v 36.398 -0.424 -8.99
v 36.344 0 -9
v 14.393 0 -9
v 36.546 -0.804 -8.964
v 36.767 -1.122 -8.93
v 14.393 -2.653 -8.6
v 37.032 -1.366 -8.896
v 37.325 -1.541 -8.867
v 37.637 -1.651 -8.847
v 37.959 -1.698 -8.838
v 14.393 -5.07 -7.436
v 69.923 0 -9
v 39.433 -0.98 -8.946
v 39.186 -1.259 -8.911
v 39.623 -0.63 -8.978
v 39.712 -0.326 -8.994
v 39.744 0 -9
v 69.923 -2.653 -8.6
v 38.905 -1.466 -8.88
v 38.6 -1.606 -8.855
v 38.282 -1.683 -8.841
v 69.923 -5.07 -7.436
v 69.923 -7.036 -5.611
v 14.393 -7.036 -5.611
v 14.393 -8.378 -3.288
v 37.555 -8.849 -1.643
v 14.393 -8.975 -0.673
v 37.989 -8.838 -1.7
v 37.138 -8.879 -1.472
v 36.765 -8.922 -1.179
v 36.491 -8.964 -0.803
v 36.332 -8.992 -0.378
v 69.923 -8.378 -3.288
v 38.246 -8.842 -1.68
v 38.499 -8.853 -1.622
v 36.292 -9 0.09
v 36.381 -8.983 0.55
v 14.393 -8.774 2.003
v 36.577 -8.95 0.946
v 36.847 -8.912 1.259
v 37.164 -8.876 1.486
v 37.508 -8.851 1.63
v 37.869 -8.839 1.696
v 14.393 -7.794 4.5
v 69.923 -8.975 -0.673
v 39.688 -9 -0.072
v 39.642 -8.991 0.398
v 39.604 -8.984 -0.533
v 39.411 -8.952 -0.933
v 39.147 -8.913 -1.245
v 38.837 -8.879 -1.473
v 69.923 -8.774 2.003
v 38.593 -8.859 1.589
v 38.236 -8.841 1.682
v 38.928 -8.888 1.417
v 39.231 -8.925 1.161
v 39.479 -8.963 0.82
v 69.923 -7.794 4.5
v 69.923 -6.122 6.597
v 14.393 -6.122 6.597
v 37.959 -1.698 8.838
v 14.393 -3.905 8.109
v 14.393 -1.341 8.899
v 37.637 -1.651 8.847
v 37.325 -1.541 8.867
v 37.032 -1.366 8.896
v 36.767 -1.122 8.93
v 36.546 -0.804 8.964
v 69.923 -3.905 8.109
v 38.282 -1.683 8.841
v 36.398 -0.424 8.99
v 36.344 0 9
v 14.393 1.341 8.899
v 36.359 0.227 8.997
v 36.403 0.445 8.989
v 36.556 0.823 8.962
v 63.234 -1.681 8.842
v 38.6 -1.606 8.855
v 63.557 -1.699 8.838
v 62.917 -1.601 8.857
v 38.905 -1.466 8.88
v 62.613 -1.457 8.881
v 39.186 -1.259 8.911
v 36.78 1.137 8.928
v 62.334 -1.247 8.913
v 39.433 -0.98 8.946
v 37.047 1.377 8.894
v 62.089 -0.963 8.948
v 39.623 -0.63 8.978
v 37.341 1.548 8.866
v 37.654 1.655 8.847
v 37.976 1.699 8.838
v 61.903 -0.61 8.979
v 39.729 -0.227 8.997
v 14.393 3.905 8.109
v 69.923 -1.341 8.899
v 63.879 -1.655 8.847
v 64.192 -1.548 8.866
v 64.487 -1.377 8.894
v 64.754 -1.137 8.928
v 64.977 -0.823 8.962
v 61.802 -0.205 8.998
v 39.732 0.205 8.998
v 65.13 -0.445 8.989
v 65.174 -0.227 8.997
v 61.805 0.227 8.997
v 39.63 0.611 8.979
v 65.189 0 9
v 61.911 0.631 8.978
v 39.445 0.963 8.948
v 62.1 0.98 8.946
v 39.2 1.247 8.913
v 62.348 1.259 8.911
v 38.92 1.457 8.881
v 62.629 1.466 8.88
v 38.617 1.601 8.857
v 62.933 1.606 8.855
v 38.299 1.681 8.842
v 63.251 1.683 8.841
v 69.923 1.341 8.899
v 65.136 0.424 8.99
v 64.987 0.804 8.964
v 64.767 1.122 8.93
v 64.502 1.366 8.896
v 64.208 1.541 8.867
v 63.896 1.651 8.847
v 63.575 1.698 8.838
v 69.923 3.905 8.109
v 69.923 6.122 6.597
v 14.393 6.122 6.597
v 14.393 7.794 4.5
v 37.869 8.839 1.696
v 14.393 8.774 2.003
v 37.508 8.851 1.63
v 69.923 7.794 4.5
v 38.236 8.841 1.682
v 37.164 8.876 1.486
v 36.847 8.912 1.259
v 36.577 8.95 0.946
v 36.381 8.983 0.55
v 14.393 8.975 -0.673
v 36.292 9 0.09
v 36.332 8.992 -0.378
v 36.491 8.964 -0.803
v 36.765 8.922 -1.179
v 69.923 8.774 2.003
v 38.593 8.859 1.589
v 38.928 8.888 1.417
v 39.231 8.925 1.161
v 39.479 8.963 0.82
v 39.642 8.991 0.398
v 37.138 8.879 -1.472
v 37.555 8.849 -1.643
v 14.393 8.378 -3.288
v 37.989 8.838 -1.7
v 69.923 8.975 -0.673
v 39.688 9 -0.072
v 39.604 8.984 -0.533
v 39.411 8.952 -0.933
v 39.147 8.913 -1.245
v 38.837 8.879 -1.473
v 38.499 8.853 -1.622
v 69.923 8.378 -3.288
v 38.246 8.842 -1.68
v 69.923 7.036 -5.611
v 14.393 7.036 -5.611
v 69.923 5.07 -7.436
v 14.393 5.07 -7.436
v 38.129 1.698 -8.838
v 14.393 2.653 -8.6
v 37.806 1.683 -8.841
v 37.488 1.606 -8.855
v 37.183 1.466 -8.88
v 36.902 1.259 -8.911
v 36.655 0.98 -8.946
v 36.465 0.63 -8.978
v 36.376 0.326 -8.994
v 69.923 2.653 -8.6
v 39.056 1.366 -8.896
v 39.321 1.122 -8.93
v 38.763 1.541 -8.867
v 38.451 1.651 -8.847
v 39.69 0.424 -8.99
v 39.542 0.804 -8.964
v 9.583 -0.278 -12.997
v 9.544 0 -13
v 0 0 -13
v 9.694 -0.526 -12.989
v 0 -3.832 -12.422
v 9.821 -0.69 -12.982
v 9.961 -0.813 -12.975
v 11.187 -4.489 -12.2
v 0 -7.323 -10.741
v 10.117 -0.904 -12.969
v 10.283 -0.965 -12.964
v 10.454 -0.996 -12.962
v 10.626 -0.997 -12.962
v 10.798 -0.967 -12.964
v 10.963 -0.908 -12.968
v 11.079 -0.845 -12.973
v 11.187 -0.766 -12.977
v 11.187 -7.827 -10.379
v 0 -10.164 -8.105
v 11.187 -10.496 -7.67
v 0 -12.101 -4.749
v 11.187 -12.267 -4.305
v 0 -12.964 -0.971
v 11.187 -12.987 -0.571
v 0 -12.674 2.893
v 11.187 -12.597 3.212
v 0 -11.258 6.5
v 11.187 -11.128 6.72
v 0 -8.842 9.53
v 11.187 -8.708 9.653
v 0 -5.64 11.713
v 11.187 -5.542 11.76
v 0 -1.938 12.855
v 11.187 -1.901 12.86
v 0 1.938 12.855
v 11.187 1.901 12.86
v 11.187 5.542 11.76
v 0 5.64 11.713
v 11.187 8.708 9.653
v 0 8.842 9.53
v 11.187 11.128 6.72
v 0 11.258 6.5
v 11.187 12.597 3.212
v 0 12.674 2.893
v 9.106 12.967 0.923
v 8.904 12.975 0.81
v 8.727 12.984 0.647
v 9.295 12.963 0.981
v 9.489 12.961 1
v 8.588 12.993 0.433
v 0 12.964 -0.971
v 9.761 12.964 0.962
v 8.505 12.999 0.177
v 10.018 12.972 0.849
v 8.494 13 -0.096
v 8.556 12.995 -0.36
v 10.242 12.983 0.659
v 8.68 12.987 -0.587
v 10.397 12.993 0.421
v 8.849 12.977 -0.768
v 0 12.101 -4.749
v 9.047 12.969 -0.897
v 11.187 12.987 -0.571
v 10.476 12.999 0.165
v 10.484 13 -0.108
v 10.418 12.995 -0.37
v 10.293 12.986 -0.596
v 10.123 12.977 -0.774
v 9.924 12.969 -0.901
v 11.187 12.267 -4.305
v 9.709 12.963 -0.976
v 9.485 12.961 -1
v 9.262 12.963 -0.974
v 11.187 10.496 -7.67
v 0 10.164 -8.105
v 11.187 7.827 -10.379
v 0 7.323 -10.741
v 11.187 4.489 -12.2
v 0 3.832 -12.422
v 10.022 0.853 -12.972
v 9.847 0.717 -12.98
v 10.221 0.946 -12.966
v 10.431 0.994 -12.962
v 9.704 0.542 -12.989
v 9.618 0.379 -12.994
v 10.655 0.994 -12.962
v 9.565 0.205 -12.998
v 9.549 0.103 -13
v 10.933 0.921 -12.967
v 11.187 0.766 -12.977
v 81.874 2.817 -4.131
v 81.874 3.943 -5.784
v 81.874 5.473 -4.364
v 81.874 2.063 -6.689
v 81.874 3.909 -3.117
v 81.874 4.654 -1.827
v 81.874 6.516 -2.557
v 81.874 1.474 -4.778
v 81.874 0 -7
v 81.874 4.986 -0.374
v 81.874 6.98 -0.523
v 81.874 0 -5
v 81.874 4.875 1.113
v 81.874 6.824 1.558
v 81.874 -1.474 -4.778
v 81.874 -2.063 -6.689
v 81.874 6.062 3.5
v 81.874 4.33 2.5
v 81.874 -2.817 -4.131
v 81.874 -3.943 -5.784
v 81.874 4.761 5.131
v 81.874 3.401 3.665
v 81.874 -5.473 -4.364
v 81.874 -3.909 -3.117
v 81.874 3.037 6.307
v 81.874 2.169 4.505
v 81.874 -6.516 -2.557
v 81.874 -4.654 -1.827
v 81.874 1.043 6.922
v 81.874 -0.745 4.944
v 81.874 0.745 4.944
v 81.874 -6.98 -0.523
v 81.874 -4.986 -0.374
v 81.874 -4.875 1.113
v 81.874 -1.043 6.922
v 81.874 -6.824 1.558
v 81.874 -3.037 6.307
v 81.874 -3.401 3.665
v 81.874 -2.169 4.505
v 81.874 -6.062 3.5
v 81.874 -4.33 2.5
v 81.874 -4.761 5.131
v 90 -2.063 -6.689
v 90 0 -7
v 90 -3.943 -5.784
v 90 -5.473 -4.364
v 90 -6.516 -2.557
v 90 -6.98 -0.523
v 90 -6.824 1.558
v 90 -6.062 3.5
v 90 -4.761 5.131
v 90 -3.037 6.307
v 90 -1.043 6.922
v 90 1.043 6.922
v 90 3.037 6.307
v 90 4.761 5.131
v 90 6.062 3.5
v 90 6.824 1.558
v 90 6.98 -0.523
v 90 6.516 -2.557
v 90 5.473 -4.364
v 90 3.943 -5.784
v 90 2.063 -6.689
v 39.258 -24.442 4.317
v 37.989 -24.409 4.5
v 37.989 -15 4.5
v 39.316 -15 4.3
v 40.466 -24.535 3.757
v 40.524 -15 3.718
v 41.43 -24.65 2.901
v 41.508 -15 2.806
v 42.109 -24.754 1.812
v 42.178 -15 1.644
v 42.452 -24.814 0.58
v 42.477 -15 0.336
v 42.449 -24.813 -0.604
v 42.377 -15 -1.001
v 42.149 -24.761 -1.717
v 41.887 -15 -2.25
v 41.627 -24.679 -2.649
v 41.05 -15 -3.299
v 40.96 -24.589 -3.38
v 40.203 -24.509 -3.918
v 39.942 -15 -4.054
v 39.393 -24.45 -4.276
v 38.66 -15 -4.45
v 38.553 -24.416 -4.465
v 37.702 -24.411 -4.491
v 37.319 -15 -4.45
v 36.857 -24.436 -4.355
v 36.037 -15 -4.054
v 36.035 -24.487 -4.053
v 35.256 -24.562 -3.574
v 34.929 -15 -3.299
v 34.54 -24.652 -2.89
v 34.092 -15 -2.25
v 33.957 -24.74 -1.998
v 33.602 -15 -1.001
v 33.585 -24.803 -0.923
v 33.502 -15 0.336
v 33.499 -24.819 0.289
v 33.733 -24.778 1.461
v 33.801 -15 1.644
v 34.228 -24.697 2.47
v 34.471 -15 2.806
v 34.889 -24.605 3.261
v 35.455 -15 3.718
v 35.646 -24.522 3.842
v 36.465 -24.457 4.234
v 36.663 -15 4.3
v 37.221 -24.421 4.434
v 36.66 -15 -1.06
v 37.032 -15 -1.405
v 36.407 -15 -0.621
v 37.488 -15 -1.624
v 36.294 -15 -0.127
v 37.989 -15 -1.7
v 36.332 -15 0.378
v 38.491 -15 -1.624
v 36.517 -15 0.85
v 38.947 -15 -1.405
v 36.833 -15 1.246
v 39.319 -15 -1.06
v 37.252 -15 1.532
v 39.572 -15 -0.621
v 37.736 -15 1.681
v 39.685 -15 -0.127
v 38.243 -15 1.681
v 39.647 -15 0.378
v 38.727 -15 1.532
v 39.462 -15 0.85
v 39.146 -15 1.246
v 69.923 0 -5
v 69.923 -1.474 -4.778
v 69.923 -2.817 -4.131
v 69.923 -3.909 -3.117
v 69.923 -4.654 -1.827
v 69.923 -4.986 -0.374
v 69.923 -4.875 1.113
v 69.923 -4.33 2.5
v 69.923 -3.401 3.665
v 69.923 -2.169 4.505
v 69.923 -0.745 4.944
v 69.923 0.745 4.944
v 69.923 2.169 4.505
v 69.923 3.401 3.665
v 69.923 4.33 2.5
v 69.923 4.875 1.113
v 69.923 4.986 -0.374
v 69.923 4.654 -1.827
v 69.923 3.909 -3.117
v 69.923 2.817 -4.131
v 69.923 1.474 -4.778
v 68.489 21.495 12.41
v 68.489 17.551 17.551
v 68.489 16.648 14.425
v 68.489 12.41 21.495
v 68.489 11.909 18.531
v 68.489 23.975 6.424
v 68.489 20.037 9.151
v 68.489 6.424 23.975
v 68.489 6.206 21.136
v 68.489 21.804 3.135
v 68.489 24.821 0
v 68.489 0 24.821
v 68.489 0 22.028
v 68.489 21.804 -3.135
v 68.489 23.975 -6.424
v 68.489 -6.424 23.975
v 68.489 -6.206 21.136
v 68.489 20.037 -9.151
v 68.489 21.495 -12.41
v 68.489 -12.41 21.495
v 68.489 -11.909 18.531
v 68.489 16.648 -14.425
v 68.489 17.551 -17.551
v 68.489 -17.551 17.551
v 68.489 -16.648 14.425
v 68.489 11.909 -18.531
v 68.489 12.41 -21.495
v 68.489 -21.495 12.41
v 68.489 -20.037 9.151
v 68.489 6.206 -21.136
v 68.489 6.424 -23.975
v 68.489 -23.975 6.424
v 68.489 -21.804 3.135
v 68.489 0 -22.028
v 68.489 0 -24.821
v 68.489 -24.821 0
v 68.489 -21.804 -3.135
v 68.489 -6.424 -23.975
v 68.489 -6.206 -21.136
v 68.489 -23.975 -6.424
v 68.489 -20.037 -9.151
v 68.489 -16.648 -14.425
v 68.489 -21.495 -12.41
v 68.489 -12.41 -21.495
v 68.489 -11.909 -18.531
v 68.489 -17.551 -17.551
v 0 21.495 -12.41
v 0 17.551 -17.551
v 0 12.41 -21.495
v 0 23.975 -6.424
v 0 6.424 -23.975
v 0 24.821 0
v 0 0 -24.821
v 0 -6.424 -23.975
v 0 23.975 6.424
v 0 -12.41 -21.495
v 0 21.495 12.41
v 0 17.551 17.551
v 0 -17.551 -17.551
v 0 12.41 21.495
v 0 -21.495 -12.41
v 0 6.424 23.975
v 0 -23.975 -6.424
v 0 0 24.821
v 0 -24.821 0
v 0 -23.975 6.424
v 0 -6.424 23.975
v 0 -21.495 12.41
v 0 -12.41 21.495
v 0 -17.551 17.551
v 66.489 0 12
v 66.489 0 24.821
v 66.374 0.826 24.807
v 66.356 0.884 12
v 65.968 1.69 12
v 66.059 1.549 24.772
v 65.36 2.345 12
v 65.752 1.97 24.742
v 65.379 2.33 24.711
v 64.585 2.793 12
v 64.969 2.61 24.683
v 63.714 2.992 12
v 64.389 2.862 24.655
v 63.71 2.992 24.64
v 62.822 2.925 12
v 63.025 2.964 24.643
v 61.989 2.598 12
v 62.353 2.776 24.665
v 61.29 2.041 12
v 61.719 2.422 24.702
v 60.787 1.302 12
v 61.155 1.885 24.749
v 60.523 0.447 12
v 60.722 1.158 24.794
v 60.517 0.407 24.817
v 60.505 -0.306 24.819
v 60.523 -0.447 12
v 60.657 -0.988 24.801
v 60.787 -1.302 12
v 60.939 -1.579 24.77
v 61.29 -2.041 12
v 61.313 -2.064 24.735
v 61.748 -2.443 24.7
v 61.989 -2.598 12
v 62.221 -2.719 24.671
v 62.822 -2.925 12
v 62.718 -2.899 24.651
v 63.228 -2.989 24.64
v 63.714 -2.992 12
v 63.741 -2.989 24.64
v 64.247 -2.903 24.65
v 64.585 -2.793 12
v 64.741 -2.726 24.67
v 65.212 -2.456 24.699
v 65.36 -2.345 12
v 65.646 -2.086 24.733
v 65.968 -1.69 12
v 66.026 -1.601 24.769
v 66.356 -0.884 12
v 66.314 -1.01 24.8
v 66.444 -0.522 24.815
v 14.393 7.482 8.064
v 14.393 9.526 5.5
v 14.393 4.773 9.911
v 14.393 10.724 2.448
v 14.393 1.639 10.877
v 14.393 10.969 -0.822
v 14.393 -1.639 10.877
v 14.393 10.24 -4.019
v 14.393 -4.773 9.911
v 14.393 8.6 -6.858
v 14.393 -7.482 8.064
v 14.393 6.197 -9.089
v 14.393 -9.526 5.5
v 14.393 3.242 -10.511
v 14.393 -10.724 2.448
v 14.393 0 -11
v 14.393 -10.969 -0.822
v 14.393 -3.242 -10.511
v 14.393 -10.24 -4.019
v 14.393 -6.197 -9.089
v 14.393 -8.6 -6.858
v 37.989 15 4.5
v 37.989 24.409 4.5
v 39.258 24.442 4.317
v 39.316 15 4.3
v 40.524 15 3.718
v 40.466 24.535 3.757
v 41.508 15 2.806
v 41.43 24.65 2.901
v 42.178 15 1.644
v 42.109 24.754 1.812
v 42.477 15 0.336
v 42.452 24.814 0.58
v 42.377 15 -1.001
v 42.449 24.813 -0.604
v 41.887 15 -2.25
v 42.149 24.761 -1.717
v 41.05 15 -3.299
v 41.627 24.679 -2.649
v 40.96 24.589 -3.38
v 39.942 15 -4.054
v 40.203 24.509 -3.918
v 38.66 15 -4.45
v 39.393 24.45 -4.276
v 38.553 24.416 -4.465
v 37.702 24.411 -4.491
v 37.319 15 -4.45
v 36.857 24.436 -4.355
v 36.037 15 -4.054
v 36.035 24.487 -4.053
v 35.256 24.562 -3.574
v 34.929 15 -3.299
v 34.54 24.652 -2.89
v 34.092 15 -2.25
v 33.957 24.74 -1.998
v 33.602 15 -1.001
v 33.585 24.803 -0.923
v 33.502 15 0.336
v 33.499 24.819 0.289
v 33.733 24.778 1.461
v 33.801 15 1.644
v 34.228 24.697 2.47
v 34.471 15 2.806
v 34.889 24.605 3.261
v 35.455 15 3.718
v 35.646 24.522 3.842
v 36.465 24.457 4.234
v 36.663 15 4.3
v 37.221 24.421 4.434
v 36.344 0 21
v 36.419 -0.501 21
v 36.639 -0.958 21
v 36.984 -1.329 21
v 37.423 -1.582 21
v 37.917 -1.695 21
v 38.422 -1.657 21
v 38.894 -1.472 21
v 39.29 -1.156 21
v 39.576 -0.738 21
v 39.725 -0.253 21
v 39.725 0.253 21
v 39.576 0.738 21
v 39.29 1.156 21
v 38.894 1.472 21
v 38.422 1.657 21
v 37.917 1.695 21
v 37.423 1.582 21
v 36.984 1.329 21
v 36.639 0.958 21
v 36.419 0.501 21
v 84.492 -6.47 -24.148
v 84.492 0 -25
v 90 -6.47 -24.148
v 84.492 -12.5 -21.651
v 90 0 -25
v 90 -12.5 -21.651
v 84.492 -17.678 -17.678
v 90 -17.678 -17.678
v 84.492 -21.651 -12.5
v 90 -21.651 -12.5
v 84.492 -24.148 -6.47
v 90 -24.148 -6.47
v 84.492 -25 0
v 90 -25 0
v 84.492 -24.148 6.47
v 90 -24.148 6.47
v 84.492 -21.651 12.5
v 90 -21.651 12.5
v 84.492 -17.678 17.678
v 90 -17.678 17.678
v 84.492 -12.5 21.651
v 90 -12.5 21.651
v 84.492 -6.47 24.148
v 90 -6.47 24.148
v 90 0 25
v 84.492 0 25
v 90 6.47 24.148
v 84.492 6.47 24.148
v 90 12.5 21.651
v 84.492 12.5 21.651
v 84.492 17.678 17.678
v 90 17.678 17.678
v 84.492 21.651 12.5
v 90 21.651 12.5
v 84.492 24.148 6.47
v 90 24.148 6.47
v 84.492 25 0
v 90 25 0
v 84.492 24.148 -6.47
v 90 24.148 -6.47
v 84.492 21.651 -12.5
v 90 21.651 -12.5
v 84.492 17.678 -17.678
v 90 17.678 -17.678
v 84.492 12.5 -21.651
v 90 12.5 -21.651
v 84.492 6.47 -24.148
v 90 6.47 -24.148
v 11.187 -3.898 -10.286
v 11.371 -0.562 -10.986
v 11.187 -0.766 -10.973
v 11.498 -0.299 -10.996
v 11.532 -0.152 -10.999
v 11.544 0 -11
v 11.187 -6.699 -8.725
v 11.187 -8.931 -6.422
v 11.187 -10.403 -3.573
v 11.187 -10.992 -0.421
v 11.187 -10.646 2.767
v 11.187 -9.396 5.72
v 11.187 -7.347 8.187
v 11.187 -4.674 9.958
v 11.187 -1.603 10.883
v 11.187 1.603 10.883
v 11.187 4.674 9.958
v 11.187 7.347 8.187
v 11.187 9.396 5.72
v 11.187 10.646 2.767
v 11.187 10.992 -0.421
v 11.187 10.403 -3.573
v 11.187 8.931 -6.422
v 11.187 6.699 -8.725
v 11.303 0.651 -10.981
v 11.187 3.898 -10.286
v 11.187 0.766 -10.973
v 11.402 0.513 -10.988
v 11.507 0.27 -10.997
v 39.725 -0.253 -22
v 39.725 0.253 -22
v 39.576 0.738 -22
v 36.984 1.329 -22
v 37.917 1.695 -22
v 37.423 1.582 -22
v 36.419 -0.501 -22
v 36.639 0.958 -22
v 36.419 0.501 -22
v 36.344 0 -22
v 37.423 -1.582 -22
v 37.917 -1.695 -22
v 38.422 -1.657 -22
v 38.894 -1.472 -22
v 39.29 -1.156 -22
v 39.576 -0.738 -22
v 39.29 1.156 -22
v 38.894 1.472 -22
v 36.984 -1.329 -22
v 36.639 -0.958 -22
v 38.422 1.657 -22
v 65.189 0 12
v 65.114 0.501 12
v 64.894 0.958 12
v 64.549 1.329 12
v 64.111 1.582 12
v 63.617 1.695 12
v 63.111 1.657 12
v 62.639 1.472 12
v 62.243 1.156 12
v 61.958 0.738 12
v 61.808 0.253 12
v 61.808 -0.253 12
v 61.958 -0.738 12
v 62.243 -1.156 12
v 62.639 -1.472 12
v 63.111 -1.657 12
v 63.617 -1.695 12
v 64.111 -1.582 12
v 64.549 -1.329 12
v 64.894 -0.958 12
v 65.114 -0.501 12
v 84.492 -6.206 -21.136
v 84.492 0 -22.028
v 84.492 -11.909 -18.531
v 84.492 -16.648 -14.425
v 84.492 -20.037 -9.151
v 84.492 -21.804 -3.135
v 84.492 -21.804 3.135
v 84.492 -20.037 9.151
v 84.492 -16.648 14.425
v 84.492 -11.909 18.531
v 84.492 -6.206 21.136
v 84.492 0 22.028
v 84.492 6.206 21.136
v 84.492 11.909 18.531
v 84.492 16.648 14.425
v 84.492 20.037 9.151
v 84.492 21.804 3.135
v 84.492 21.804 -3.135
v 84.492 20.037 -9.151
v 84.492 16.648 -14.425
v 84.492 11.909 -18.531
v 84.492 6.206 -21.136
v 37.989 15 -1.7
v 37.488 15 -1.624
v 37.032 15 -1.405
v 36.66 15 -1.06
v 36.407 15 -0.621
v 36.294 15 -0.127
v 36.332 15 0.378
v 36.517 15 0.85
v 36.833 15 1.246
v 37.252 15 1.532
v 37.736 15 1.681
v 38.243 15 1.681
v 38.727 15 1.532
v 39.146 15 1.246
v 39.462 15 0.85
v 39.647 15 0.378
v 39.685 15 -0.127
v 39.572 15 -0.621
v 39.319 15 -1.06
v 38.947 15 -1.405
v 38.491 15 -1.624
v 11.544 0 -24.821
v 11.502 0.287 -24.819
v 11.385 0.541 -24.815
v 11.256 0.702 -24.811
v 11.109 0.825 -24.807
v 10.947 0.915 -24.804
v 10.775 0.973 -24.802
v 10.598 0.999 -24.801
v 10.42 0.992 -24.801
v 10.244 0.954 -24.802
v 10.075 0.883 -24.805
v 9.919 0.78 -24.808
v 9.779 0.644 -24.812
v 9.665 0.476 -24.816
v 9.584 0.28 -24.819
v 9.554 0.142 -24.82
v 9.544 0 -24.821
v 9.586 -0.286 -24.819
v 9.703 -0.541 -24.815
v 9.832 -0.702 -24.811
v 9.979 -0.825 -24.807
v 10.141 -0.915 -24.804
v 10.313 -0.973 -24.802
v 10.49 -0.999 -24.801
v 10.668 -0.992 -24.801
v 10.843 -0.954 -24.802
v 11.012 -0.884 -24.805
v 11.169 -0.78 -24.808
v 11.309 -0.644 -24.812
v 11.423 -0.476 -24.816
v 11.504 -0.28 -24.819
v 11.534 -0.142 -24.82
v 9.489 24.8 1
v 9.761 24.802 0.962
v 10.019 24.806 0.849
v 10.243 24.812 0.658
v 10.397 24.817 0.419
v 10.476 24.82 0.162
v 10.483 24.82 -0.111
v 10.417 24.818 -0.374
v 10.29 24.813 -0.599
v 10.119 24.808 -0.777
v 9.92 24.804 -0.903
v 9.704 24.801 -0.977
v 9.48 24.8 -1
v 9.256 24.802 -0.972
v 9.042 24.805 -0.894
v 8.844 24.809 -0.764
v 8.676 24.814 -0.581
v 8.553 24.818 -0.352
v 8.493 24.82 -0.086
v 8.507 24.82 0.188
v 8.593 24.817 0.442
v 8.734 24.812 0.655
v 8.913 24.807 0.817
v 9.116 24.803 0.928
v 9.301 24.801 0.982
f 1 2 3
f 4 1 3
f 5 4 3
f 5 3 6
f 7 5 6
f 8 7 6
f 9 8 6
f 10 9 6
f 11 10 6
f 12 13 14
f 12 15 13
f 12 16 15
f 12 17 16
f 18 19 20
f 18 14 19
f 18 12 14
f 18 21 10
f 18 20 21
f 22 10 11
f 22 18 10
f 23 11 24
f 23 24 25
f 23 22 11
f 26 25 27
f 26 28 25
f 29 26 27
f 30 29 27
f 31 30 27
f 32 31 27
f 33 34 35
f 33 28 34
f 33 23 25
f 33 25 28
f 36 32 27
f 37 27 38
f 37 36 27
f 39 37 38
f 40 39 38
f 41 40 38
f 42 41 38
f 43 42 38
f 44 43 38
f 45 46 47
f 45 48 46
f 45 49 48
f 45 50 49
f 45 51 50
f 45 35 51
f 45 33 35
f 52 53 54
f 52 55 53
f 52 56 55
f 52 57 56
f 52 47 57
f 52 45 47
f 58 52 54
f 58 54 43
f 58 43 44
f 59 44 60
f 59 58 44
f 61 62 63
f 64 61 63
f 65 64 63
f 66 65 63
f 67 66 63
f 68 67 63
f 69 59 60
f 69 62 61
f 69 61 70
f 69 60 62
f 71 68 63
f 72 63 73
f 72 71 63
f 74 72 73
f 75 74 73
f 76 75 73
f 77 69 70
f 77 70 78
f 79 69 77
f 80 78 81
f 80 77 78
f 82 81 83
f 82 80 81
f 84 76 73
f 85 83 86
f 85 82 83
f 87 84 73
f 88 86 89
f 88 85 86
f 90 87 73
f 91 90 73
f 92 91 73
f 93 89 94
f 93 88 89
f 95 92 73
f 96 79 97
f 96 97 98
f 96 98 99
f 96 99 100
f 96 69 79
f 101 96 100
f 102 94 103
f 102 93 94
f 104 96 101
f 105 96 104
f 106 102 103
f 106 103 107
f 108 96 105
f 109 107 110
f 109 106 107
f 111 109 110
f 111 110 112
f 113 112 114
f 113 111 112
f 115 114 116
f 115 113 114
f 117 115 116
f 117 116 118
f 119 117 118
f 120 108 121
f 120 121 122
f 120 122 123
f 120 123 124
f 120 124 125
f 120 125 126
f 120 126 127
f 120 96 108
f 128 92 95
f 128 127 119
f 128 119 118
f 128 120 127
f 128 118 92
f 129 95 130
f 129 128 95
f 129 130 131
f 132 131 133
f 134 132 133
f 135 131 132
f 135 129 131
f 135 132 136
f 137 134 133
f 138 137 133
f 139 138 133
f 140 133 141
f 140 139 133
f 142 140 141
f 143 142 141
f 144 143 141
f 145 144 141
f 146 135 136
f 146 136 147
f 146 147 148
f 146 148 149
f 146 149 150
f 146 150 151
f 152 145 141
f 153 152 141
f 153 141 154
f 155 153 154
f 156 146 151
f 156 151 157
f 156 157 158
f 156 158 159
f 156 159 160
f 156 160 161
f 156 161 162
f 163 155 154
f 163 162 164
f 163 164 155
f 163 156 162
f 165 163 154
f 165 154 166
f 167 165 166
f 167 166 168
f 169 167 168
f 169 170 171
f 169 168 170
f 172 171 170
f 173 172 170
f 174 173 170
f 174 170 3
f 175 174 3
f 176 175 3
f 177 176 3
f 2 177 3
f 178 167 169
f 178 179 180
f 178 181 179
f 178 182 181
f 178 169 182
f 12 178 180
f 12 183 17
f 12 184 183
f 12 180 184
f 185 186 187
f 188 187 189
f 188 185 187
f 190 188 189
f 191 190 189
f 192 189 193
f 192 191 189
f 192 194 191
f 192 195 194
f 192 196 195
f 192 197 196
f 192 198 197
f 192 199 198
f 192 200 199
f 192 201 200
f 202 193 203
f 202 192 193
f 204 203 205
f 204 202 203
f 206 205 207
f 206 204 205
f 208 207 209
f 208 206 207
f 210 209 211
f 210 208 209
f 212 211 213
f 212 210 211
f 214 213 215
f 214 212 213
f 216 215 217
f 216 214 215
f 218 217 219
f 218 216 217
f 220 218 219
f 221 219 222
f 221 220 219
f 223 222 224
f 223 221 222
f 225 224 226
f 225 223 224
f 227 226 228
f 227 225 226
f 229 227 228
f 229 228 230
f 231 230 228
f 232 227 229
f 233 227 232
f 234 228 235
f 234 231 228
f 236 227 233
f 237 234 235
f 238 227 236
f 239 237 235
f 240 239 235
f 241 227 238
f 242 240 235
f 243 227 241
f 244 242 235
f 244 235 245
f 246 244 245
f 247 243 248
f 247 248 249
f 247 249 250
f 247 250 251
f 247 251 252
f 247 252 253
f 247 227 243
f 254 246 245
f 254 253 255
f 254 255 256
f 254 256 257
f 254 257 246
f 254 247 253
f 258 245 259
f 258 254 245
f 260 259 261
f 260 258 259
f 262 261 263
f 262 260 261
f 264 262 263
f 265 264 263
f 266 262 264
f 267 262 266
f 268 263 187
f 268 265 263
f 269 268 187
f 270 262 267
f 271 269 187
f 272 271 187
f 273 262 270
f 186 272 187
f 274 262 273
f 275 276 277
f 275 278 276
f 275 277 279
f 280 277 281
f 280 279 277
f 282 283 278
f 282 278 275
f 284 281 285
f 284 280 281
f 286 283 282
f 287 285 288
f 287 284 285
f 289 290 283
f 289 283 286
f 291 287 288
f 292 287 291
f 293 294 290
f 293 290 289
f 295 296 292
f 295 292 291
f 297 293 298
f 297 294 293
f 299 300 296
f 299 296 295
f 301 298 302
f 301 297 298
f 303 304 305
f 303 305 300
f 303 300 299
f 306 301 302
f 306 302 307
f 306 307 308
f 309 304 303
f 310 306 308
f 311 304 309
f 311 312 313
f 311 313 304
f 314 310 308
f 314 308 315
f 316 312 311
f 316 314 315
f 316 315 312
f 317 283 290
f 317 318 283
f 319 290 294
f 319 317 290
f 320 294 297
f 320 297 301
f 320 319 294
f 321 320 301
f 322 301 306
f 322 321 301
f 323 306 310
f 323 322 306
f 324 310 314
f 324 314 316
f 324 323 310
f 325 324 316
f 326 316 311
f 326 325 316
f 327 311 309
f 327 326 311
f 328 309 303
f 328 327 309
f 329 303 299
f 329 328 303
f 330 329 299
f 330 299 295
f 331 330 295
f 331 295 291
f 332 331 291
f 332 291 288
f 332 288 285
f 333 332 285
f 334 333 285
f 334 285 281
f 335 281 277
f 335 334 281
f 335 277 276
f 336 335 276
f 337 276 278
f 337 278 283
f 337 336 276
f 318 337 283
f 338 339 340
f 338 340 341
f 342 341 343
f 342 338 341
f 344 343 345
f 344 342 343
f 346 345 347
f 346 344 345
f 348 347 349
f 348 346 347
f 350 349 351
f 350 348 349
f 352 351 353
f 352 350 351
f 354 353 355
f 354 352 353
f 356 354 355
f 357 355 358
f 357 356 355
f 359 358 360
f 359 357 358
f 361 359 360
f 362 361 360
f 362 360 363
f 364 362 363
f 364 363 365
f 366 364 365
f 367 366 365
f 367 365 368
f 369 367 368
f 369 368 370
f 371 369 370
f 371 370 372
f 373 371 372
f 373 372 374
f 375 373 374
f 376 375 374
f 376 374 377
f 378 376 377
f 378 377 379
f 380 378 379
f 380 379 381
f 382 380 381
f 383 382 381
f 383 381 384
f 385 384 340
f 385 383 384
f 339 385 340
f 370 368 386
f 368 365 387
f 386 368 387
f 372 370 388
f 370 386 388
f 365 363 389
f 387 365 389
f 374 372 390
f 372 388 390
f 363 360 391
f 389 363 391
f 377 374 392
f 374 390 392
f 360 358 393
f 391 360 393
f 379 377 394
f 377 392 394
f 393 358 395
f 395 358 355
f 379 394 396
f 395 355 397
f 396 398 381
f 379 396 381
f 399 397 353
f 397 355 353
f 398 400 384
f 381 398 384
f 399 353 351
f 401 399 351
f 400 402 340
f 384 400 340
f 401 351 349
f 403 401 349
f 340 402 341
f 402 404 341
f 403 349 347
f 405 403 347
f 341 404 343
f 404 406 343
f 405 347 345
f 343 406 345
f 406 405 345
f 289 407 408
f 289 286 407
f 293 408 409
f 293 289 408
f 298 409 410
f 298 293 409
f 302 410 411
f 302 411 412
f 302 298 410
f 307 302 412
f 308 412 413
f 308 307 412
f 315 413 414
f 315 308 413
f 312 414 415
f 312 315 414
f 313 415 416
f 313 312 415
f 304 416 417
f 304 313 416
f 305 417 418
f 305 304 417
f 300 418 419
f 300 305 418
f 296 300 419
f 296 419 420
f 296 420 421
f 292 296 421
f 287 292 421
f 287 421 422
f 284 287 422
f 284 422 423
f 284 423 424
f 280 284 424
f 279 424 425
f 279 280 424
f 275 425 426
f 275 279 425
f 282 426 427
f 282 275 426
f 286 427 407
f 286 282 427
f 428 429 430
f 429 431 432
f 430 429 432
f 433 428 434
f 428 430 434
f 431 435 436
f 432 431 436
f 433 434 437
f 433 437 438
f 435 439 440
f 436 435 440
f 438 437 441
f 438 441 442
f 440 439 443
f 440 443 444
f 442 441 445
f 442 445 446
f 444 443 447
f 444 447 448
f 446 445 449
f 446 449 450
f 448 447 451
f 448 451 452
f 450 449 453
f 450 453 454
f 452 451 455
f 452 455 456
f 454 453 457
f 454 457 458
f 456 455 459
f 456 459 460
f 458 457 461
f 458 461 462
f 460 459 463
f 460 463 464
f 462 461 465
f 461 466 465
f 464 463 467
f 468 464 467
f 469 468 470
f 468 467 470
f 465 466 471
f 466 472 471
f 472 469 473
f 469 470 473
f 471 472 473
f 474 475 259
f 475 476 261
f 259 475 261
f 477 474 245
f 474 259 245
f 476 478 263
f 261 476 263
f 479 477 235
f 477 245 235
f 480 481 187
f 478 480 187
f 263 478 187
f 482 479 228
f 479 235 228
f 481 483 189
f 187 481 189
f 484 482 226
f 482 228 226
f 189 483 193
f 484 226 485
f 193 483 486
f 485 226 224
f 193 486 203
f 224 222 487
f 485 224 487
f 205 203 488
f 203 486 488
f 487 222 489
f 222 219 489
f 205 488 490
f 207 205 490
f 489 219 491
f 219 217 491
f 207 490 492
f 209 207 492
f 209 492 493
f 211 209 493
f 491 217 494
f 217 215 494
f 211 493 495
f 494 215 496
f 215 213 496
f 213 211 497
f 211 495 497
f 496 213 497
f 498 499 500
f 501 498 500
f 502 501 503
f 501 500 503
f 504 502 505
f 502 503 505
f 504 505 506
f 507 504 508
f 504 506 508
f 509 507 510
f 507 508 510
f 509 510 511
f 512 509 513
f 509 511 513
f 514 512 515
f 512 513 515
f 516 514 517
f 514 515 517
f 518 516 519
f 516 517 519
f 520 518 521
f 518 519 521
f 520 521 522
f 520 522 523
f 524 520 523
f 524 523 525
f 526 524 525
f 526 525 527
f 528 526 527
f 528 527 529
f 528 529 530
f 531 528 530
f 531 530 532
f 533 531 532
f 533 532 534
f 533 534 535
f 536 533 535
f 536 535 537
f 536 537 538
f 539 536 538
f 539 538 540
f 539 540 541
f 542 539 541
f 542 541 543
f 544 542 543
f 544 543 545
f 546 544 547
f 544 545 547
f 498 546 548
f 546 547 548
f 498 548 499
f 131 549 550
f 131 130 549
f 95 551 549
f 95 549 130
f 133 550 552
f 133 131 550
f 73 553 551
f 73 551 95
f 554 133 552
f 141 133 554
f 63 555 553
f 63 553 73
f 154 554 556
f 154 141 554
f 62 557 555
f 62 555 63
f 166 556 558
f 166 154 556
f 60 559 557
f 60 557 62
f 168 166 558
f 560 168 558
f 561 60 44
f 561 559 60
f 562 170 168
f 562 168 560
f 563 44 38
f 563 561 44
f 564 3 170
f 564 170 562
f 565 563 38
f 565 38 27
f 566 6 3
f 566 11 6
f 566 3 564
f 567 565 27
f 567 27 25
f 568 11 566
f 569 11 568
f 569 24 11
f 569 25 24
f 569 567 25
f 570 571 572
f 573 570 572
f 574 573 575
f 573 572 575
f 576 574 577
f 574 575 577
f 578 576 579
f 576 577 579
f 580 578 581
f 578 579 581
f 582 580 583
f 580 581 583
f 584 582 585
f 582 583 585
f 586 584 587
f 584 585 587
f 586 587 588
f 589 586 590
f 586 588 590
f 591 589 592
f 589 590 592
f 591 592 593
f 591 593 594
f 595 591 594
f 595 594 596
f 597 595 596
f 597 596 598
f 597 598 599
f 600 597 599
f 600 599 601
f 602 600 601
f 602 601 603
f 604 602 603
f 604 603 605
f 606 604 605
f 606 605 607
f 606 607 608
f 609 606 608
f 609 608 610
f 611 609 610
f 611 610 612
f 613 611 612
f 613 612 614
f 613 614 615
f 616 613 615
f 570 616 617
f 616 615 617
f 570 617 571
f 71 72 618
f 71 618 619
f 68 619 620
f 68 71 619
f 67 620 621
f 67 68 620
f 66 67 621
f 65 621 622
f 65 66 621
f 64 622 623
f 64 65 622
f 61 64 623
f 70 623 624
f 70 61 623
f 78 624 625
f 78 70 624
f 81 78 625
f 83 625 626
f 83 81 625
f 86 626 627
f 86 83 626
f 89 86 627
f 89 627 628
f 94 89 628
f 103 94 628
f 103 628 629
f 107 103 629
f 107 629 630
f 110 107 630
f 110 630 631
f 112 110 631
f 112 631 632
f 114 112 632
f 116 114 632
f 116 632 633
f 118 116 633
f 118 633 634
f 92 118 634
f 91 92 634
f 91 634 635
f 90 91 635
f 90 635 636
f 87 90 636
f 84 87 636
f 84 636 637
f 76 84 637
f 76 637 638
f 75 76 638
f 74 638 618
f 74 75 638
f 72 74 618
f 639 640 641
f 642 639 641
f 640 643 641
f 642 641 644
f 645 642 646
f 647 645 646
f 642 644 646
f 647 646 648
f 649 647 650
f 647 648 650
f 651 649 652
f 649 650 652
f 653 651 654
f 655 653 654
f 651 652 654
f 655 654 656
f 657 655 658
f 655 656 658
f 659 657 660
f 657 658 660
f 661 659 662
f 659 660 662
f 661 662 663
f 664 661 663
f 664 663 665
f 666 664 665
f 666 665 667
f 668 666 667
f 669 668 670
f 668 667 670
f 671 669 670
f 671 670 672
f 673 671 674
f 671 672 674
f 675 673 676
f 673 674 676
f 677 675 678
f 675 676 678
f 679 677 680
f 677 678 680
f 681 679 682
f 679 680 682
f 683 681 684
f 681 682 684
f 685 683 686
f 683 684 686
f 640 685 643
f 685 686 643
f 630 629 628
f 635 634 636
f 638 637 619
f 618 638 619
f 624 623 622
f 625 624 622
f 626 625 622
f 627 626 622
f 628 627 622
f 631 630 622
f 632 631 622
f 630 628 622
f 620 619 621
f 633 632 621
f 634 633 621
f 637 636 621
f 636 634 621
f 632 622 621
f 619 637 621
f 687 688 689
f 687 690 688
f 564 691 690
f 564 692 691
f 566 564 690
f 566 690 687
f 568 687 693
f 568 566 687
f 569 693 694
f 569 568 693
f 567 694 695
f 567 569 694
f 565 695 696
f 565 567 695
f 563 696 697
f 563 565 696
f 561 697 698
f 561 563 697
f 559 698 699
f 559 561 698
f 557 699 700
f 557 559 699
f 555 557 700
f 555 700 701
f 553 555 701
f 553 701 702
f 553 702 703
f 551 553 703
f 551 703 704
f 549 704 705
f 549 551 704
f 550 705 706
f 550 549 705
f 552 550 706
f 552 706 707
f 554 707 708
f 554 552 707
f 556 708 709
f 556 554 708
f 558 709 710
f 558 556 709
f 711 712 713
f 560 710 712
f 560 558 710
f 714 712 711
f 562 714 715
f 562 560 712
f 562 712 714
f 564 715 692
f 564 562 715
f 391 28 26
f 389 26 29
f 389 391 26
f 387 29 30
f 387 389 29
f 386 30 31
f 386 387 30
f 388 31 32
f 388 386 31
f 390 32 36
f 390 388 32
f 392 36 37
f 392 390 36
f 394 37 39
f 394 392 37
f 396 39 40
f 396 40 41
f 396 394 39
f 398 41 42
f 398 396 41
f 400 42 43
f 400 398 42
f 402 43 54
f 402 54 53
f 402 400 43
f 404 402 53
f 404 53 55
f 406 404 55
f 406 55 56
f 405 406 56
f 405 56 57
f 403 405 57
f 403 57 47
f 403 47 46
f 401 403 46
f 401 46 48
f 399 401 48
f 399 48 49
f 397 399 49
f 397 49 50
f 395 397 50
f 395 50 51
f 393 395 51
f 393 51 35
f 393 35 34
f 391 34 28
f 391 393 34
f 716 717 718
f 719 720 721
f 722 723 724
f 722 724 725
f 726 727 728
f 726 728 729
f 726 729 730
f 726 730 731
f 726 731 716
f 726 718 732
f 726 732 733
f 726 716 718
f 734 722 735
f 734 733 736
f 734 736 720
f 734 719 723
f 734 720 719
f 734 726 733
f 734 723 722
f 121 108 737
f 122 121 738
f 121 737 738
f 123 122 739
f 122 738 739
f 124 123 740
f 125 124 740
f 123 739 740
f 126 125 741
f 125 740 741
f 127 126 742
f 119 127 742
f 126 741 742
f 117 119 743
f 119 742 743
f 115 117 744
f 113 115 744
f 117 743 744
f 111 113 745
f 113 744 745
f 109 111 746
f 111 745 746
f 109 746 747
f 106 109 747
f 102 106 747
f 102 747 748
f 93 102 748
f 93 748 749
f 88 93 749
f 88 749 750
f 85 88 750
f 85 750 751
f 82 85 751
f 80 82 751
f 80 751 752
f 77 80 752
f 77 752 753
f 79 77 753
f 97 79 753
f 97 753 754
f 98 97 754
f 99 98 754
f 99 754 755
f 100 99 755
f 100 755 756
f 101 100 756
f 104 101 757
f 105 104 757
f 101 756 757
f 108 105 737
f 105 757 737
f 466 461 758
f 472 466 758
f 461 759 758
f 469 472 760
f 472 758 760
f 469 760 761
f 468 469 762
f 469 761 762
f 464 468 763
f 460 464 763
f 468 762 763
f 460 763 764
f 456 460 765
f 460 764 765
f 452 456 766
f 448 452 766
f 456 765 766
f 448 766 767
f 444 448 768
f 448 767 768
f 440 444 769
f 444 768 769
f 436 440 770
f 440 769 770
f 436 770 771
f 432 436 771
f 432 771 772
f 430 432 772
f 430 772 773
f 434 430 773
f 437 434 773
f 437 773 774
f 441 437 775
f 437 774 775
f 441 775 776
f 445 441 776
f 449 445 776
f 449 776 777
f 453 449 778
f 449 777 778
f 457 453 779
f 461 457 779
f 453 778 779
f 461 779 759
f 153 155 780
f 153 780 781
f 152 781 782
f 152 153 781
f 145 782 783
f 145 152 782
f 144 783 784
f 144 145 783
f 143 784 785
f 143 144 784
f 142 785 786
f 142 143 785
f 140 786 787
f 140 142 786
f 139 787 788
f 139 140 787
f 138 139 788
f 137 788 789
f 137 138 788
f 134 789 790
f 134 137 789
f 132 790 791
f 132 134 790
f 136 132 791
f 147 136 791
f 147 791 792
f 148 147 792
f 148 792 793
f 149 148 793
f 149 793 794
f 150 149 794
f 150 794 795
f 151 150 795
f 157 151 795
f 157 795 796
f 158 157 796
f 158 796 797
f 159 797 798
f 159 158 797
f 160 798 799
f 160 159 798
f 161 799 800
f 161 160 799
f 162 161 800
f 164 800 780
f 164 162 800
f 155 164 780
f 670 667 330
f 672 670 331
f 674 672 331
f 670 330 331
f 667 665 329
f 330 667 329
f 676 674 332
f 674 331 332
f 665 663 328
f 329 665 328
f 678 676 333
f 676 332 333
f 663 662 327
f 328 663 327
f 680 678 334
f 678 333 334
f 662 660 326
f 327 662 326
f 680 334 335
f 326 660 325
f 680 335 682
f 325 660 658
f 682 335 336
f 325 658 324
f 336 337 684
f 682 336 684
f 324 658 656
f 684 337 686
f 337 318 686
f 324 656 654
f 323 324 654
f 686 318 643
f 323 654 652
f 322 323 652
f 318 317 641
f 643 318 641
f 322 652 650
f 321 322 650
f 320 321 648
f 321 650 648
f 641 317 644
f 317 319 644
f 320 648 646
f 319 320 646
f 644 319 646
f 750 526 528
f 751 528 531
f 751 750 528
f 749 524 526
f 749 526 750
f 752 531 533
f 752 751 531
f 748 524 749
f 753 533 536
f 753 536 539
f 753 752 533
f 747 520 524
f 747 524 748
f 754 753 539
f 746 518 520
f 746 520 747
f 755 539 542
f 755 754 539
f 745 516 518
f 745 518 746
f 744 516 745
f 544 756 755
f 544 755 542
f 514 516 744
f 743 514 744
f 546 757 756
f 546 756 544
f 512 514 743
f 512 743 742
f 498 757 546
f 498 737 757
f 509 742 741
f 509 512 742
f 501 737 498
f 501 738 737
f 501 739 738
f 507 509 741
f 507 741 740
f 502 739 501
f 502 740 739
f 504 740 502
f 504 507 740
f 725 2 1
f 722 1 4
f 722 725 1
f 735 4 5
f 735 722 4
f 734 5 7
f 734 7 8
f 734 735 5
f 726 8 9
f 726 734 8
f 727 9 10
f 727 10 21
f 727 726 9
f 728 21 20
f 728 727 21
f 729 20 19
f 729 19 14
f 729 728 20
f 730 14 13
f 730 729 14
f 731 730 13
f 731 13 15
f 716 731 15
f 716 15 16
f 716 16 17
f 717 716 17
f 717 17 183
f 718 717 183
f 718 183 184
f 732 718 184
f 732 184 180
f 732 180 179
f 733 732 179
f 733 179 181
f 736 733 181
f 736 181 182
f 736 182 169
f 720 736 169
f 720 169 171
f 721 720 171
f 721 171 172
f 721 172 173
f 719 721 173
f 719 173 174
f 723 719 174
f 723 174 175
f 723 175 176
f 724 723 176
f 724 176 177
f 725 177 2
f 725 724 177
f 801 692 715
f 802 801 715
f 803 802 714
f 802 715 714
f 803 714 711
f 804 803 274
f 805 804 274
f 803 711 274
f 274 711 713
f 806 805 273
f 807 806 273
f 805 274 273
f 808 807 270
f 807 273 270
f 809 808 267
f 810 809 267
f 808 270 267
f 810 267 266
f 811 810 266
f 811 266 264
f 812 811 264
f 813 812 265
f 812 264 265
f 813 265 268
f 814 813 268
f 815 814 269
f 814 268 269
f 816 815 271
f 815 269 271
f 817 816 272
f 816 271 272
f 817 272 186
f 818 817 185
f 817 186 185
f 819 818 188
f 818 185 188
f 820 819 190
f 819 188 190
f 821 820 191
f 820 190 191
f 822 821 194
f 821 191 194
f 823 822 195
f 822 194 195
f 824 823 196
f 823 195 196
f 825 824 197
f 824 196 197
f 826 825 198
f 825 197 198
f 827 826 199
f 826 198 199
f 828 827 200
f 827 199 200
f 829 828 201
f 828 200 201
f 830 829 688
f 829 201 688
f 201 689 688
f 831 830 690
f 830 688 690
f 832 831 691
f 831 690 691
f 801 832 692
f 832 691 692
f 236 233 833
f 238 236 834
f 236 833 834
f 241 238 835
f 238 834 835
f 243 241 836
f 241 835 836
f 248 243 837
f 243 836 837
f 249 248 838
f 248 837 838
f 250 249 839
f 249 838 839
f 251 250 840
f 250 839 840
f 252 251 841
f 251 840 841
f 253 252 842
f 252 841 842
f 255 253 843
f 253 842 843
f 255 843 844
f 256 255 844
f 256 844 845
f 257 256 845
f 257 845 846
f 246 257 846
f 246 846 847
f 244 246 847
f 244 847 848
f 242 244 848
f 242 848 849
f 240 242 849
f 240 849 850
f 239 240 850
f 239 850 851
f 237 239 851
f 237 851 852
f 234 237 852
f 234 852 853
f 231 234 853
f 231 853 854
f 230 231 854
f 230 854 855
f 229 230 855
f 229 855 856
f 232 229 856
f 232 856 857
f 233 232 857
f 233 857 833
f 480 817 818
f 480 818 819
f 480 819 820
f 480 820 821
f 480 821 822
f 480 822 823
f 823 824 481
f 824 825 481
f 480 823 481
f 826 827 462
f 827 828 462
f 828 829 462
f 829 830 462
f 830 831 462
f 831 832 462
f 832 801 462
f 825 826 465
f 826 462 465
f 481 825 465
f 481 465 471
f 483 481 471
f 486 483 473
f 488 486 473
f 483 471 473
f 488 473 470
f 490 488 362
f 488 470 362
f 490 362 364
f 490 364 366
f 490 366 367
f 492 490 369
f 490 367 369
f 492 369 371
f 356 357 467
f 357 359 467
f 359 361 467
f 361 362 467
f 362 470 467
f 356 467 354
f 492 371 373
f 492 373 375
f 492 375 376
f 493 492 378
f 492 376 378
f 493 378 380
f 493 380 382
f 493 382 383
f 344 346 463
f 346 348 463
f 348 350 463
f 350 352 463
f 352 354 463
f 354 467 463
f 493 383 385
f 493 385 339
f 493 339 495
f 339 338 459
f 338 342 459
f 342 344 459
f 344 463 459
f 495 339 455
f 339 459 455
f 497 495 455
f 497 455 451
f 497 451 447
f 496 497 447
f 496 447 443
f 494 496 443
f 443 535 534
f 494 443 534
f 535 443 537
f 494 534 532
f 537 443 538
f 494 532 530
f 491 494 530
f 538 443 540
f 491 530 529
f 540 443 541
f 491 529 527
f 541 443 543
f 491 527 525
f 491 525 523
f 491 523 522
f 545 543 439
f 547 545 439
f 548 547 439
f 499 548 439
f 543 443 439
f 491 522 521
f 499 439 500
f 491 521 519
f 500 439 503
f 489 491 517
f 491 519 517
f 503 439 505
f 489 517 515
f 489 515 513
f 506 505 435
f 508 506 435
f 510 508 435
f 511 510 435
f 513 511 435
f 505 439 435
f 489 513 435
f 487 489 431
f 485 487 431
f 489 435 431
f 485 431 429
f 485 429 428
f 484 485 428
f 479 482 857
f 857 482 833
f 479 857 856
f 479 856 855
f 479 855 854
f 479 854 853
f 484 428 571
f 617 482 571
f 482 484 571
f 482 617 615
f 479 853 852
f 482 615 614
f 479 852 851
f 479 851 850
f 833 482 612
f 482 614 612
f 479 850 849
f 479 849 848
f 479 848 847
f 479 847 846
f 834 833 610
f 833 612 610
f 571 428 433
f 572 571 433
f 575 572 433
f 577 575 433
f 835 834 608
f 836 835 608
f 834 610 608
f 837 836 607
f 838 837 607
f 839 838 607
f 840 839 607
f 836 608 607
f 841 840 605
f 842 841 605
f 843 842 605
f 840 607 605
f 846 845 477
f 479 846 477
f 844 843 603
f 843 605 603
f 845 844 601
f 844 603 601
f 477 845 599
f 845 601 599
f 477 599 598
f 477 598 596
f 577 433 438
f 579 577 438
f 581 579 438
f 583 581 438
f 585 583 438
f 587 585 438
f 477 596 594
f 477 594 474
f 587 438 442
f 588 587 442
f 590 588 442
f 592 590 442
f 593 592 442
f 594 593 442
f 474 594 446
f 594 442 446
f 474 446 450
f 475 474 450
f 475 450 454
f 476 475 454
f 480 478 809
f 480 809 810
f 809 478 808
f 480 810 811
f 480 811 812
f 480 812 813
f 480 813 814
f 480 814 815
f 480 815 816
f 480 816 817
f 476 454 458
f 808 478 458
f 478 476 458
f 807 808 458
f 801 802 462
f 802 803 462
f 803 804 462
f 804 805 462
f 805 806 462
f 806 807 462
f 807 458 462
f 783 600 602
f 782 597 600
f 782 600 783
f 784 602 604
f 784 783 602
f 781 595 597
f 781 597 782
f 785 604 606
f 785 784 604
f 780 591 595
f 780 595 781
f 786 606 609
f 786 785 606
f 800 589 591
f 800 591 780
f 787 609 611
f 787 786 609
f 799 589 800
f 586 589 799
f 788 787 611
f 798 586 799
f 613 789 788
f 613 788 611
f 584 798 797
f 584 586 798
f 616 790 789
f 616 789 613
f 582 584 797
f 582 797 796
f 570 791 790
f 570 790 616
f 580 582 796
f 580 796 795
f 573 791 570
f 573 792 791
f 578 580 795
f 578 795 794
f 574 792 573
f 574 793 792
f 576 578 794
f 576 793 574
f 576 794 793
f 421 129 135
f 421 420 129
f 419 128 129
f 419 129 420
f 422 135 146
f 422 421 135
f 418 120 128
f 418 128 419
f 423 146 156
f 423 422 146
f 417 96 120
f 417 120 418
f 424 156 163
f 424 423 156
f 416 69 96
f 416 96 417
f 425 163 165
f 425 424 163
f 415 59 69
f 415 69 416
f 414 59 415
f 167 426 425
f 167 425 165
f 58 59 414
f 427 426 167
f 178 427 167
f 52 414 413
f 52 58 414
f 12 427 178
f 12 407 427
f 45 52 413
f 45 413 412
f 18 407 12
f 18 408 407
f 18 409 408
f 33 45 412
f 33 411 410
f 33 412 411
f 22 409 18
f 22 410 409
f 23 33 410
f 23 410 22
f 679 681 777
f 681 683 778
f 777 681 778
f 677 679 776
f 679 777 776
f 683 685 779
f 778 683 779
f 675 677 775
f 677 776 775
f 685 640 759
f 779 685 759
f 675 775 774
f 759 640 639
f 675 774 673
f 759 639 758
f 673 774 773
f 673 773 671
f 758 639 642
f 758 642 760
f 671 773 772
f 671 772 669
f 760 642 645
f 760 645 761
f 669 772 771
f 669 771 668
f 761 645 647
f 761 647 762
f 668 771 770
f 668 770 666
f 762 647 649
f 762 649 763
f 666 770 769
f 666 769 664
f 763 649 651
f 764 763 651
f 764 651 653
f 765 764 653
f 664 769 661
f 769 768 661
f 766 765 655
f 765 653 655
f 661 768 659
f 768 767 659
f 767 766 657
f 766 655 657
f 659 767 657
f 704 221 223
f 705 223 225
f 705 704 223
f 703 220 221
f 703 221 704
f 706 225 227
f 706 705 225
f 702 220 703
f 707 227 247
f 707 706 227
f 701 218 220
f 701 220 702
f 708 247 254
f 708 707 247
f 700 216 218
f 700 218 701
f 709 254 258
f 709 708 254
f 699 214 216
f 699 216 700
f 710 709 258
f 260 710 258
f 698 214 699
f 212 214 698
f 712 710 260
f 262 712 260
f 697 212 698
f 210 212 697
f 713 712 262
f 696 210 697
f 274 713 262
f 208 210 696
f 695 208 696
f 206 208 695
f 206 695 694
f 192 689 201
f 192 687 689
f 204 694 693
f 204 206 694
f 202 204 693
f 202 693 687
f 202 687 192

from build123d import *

# Parameters (mm, degrees)
CUT_EXTRUDE1_DEPTH      = 21
CUT_EXTRUDE1_DEPTH_BACK = 22
SKETCH4_R               = 1.7
SKETCH5_R               = 1
CUT_EXTRUDE2_DEPTH      = 32
CUT_EXTRUDE3_DEPTH      = 106.948100502
CUT_EXTRUDE3_DEPTH_BACK = 61
SKETCH7_R               = 1.7
SKETCH8_R               = 1.7
CUT_EXTRUDE4_DEPTH      = 25
SKETCH9_R               = 1
CUT_EXTRUDE5_DEPTH      = 25
SKETCH10_R              = 4.5
CUT_EXTRUDE6_DEPTH      = 10
SKETCH11_R              = 3
CUT_EXTRUDE7_DEPTH      = 13


with BuildPart() as part:
    # Sketch1 → Revolve1 (revolve)
    with BuildSketch(Plane.XY):
        Polygon((0, 0), (0, 24.820612545), (68.489462458, 24.820612545), (68.489462458, 22.028059354), (84.491973548, 22.028059354), (84.491973548, 25), (90, 25), (90, 0), align=None)
    revolve(axis=Axis((0, 0, 0), (-1, 0, 0)))

    # Sketch3 → Cut-Revolve1 (revolve, cut)
    with BuildSketch(Plane(origin=(0, 0, 0), x_dir=(1, 0, 0), z_dir=(0, 1, 0))):
        Polygon((0, 0), (0, 13), (11.186820081, 13), (11.186820081, 11), (14.393242315, 11), (14.393242315, 9), (69.922645544, 9), (69.922645544, 5), (81.873855688, 5), (81.873855688, 7), (90, 7), (90, 0), align=None)
    revolve(axis=Axis((96.448502204, 0, 0), (-1, 0, 0)), mode=Mode.SUBTRACT)

    # Sketch4 → Cut-Extrude1 (cut, two sides: drawn at the far end of the back side and taken through both)
    with BuildSketch(Plane.XY.offset(-CUT_EXTRUDE1_DEPTH_BACK)):
        with Locations((38.043963981, 0)):
            Circle(SKETCH4_R)
    extrude(amount=CUT_EXTRUDE1_DEPTH + CUT_EXTRUDE1_DEPTH_BACK, mode=Mode.SUBTRACT)

    # Sketch5 → Cut-Extrude2 (cut)
    with BuildSketch(Plane.XY):
        with Locations((10.543963981, 0)):
            Circle(SKETCH5_R)
    extrude(amount=-CUT_EXTRUDE2_DEPTH, mode=Mode.SUBTRACT)

    # Sketch7 → Cut-Extrude3 (cut, two sides: drawn at the far end of the back side and taken through both)
    with BuildSketch(Plane(origin=(0, 25, 0), x_dir=(1, 0, 0), z_dir=(0, 1, 0)).offset(-CUT_EXTRUDE3_DEPTH_BACK)):
        with Locations((37.989462458, 0)):
            Circle(SKETCH7_R)
    extrude(amount=CUT_EXTRUDE3_DEPTH + CUT_EXTRUDE3_DEPTH_BACK, mode=Mode.SUBTRACT)

    # Sketch8 → Cut-Extrude4 (cut)
    with BuildSketch(Plane.XY.offset(25)):
        with Locations((63.489462458, 0)):
            Circle(SKETCH8_R)
    extrude(amount=-CUT_EXTRUDE4_DEPTH, mode=Mode.SUBTRACT)

    # Sketch9 → Cut-Extrude5 (cut)
    with BuildSketch(Plane(origin=(0, 25, 0), x_dir=(1, 0, 0), z_dir=(0, 1, 0))):
        with Locations((9.489462458, 0)):
            Circle(SKETCH9_R)
    extrude(amount=-CUT_EXTRUDE5_DEPTH, mode=Mode.SUBTRACT)

    # Sketch10 → Cut-Extrude6 (cut)
    with BuildSketch(Plane(origin=(0, 25, 0), x_dir=(1, 0, 0), z_dir=(0, 1, 0))):
        with Locations((37.989462458, 0)):
            Circle(SKETCH10_R)
    cut_extrude6 = extrude(amount=-CUT_EXTRUDE6_DEPTH, mode=Mode.SUBTRACT)

    # Mirror1: Cut-Extrude6 across plane
    add(cut_extrude6.mirror(Plane.ZX), mode=Mode.SUBTRACT)

    # Sketch11 → Cut-Extrude7 (cut)
    with BuildSketch(Plane.XY.offset(25)):
        with Locations((63.489462458, 0)):
            Circle(SKETCH11_R)
    extrude(amount=-CUT_EXTRUDE7_DEPTH, mode=Mode.SUBTRACT)


solid = part.part
